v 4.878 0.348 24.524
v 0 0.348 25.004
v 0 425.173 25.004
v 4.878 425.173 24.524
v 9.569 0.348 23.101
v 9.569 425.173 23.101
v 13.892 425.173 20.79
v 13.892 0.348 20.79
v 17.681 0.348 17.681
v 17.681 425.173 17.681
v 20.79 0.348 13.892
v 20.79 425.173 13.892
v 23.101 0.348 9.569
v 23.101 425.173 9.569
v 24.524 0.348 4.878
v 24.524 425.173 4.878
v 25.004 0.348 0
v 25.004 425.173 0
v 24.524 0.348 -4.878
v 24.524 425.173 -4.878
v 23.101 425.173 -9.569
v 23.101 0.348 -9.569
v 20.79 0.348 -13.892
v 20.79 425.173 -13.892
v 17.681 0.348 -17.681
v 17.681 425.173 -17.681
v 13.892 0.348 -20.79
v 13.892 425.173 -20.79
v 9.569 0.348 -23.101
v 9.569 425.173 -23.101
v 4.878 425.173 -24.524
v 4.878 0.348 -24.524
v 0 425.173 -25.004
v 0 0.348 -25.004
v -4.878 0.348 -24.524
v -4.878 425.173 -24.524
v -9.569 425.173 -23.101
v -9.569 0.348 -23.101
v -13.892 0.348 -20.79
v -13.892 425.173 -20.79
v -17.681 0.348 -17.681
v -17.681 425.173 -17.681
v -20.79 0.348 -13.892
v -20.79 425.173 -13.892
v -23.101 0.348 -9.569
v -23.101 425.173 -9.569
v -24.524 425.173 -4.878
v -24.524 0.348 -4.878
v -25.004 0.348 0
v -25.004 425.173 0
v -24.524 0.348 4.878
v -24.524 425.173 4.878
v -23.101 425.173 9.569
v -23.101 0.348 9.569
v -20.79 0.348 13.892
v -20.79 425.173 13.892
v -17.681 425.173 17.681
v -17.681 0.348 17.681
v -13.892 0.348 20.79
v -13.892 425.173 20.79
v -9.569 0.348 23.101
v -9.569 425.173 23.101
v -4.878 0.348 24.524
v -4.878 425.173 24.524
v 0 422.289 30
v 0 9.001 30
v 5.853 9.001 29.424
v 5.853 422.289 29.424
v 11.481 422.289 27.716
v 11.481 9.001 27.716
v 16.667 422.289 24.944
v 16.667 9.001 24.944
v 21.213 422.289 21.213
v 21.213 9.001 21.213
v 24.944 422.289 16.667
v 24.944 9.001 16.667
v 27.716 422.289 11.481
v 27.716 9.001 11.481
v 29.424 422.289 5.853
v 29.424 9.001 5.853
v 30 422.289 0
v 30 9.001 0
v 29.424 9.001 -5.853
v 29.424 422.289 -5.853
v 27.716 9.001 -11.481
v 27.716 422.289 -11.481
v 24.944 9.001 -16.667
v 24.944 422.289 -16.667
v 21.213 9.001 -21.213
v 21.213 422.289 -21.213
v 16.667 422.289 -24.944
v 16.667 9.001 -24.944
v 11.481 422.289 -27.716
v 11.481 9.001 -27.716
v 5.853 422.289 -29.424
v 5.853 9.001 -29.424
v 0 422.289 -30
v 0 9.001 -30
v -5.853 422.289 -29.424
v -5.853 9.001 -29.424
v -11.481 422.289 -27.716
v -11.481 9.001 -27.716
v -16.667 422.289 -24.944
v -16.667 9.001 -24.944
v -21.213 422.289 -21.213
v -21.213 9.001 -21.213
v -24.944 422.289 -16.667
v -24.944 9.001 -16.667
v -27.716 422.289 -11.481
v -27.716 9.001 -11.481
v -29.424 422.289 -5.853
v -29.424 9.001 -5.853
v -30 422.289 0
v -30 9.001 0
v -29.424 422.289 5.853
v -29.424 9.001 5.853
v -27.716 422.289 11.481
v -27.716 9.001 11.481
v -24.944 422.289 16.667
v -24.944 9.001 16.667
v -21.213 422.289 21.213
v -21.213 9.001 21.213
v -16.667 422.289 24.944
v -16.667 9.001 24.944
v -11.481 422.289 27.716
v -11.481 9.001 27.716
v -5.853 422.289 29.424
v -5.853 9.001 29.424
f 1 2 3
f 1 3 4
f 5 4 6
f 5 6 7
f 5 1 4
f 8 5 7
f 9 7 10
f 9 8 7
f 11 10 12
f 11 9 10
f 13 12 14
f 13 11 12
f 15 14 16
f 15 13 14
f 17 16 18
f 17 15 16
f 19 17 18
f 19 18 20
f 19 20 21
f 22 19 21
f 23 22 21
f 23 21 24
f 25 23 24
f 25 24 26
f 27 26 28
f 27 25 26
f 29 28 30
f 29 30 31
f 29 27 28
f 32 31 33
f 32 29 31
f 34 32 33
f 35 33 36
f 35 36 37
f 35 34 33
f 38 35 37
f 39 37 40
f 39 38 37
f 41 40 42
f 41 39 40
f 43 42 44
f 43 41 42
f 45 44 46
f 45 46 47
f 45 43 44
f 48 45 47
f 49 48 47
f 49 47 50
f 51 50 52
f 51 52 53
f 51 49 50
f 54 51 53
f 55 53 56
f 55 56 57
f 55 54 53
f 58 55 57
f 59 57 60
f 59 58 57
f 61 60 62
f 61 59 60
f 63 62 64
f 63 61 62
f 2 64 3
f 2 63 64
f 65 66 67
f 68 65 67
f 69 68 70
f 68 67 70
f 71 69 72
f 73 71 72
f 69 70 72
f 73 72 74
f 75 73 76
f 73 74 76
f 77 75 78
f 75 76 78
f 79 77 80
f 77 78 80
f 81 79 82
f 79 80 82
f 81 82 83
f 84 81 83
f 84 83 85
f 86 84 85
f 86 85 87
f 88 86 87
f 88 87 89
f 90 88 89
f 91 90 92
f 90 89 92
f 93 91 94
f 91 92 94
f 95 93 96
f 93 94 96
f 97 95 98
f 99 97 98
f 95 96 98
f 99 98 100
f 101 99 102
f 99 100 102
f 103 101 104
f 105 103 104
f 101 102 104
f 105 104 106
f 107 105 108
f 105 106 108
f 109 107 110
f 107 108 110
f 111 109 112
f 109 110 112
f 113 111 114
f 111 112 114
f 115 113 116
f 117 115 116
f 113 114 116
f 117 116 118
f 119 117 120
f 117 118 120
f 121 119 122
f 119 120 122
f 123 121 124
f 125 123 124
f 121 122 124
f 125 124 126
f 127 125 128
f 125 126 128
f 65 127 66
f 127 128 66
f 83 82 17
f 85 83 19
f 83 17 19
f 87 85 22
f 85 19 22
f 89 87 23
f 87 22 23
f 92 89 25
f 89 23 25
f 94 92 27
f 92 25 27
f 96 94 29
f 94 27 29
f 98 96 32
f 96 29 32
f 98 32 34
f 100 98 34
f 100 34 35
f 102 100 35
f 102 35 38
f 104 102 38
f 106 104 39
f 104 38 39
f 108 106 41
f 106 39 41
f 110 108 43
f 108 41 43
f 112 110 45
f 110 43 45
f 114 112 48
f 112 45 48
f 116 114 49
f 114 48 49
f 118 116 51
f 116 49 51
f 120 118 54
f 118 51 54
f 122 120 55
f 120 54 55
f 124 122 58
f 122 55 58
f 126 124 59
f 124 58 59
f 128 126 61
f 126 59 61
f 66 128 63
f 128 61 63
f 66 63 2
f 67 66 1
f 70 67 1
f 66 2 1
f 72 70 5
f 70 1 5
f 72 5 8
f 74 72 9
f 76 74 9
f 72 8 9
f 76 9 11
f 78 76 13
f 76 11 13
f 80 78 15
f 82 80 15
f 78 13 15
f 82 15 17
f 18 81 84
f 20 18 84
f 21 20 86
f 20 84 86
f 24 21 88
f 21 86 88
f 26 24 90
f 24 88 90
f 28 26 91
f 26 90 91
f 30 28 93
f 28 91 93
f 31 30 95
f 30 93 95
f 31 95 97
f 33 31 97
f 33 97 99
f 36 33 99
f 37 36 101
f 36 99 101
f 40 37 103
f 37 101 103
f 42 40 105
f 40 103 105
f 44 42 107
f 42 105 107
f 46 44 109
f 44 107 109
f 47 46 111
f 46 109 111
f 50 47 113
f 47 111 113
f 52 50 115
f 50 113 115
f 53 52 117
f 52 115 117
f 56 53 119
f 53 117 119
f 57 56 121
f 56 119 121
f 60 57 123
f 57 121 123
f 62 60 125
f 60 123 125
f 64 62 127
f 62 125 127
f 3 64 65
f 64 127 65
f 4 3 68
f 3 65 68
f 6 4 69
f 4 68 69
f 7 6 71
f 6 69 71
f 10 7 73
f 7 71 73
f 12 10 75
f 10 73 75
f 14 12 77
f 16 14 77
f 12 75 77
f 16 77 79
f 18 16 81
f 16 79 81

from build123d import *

# Parameters (mm, degrees)
SKETCH1_R           = 30
BOSS_EXTRUDE1_DEPTH = 427.485478
SKETCH2_R           = 25.004464226
CUT_EXTRUDE1_DEPTH  = 430.585653742


with BuildPart() as part:
    # Sketch1 → Boss-Extrude1 (new body)
    with BuildSketch(Plane(origin=(0, 0, 0), x_dir=(1, 0, 0), z_dir=(0, 1, 0))):
        with Locations(Location((0, 0, 0), (0, 0, 270))):
            Circle(SKETCH1_R)
    extrude(amount=BOSS_EXTRUDE1_DEPTH)

    # Sketch2 → Cut-Extrude1 (cut, through all)
    with BuildSketch(Plane(origin=(0, 0, 0), x_dir=(1, 0, 0), z_dir=(0, 1, 0))):
        with Locations(Location((0, 0, 0), (0, 0, 270))):
            Circle(SKETCH2_R)
    extrude(amount=CUT_EXTRUDE1_DEPTH, mode=Mode.SUBTRACT)

    # Chamfer1: read off the stored shape, not the designer's step
    # Chamfer1 outline → Chamfer1 (revolve, cut)
    with BuildSketch(Plane.XY):
        Polygon((30, 422.288826614), (30, 427.485477895), (25.004464226, 427.485477895), (25.004464226, 425.173000538), align=None)
        Polygon((30, 9.000864049), (25.004464226, 0.348342277), (25.004464226, 0), (30, 0), align=None)
    revolve(axis=Axis((0, 0, 0), (0, 1, 0)), mode=Mode.SUBTRACT)


solid = part.part
